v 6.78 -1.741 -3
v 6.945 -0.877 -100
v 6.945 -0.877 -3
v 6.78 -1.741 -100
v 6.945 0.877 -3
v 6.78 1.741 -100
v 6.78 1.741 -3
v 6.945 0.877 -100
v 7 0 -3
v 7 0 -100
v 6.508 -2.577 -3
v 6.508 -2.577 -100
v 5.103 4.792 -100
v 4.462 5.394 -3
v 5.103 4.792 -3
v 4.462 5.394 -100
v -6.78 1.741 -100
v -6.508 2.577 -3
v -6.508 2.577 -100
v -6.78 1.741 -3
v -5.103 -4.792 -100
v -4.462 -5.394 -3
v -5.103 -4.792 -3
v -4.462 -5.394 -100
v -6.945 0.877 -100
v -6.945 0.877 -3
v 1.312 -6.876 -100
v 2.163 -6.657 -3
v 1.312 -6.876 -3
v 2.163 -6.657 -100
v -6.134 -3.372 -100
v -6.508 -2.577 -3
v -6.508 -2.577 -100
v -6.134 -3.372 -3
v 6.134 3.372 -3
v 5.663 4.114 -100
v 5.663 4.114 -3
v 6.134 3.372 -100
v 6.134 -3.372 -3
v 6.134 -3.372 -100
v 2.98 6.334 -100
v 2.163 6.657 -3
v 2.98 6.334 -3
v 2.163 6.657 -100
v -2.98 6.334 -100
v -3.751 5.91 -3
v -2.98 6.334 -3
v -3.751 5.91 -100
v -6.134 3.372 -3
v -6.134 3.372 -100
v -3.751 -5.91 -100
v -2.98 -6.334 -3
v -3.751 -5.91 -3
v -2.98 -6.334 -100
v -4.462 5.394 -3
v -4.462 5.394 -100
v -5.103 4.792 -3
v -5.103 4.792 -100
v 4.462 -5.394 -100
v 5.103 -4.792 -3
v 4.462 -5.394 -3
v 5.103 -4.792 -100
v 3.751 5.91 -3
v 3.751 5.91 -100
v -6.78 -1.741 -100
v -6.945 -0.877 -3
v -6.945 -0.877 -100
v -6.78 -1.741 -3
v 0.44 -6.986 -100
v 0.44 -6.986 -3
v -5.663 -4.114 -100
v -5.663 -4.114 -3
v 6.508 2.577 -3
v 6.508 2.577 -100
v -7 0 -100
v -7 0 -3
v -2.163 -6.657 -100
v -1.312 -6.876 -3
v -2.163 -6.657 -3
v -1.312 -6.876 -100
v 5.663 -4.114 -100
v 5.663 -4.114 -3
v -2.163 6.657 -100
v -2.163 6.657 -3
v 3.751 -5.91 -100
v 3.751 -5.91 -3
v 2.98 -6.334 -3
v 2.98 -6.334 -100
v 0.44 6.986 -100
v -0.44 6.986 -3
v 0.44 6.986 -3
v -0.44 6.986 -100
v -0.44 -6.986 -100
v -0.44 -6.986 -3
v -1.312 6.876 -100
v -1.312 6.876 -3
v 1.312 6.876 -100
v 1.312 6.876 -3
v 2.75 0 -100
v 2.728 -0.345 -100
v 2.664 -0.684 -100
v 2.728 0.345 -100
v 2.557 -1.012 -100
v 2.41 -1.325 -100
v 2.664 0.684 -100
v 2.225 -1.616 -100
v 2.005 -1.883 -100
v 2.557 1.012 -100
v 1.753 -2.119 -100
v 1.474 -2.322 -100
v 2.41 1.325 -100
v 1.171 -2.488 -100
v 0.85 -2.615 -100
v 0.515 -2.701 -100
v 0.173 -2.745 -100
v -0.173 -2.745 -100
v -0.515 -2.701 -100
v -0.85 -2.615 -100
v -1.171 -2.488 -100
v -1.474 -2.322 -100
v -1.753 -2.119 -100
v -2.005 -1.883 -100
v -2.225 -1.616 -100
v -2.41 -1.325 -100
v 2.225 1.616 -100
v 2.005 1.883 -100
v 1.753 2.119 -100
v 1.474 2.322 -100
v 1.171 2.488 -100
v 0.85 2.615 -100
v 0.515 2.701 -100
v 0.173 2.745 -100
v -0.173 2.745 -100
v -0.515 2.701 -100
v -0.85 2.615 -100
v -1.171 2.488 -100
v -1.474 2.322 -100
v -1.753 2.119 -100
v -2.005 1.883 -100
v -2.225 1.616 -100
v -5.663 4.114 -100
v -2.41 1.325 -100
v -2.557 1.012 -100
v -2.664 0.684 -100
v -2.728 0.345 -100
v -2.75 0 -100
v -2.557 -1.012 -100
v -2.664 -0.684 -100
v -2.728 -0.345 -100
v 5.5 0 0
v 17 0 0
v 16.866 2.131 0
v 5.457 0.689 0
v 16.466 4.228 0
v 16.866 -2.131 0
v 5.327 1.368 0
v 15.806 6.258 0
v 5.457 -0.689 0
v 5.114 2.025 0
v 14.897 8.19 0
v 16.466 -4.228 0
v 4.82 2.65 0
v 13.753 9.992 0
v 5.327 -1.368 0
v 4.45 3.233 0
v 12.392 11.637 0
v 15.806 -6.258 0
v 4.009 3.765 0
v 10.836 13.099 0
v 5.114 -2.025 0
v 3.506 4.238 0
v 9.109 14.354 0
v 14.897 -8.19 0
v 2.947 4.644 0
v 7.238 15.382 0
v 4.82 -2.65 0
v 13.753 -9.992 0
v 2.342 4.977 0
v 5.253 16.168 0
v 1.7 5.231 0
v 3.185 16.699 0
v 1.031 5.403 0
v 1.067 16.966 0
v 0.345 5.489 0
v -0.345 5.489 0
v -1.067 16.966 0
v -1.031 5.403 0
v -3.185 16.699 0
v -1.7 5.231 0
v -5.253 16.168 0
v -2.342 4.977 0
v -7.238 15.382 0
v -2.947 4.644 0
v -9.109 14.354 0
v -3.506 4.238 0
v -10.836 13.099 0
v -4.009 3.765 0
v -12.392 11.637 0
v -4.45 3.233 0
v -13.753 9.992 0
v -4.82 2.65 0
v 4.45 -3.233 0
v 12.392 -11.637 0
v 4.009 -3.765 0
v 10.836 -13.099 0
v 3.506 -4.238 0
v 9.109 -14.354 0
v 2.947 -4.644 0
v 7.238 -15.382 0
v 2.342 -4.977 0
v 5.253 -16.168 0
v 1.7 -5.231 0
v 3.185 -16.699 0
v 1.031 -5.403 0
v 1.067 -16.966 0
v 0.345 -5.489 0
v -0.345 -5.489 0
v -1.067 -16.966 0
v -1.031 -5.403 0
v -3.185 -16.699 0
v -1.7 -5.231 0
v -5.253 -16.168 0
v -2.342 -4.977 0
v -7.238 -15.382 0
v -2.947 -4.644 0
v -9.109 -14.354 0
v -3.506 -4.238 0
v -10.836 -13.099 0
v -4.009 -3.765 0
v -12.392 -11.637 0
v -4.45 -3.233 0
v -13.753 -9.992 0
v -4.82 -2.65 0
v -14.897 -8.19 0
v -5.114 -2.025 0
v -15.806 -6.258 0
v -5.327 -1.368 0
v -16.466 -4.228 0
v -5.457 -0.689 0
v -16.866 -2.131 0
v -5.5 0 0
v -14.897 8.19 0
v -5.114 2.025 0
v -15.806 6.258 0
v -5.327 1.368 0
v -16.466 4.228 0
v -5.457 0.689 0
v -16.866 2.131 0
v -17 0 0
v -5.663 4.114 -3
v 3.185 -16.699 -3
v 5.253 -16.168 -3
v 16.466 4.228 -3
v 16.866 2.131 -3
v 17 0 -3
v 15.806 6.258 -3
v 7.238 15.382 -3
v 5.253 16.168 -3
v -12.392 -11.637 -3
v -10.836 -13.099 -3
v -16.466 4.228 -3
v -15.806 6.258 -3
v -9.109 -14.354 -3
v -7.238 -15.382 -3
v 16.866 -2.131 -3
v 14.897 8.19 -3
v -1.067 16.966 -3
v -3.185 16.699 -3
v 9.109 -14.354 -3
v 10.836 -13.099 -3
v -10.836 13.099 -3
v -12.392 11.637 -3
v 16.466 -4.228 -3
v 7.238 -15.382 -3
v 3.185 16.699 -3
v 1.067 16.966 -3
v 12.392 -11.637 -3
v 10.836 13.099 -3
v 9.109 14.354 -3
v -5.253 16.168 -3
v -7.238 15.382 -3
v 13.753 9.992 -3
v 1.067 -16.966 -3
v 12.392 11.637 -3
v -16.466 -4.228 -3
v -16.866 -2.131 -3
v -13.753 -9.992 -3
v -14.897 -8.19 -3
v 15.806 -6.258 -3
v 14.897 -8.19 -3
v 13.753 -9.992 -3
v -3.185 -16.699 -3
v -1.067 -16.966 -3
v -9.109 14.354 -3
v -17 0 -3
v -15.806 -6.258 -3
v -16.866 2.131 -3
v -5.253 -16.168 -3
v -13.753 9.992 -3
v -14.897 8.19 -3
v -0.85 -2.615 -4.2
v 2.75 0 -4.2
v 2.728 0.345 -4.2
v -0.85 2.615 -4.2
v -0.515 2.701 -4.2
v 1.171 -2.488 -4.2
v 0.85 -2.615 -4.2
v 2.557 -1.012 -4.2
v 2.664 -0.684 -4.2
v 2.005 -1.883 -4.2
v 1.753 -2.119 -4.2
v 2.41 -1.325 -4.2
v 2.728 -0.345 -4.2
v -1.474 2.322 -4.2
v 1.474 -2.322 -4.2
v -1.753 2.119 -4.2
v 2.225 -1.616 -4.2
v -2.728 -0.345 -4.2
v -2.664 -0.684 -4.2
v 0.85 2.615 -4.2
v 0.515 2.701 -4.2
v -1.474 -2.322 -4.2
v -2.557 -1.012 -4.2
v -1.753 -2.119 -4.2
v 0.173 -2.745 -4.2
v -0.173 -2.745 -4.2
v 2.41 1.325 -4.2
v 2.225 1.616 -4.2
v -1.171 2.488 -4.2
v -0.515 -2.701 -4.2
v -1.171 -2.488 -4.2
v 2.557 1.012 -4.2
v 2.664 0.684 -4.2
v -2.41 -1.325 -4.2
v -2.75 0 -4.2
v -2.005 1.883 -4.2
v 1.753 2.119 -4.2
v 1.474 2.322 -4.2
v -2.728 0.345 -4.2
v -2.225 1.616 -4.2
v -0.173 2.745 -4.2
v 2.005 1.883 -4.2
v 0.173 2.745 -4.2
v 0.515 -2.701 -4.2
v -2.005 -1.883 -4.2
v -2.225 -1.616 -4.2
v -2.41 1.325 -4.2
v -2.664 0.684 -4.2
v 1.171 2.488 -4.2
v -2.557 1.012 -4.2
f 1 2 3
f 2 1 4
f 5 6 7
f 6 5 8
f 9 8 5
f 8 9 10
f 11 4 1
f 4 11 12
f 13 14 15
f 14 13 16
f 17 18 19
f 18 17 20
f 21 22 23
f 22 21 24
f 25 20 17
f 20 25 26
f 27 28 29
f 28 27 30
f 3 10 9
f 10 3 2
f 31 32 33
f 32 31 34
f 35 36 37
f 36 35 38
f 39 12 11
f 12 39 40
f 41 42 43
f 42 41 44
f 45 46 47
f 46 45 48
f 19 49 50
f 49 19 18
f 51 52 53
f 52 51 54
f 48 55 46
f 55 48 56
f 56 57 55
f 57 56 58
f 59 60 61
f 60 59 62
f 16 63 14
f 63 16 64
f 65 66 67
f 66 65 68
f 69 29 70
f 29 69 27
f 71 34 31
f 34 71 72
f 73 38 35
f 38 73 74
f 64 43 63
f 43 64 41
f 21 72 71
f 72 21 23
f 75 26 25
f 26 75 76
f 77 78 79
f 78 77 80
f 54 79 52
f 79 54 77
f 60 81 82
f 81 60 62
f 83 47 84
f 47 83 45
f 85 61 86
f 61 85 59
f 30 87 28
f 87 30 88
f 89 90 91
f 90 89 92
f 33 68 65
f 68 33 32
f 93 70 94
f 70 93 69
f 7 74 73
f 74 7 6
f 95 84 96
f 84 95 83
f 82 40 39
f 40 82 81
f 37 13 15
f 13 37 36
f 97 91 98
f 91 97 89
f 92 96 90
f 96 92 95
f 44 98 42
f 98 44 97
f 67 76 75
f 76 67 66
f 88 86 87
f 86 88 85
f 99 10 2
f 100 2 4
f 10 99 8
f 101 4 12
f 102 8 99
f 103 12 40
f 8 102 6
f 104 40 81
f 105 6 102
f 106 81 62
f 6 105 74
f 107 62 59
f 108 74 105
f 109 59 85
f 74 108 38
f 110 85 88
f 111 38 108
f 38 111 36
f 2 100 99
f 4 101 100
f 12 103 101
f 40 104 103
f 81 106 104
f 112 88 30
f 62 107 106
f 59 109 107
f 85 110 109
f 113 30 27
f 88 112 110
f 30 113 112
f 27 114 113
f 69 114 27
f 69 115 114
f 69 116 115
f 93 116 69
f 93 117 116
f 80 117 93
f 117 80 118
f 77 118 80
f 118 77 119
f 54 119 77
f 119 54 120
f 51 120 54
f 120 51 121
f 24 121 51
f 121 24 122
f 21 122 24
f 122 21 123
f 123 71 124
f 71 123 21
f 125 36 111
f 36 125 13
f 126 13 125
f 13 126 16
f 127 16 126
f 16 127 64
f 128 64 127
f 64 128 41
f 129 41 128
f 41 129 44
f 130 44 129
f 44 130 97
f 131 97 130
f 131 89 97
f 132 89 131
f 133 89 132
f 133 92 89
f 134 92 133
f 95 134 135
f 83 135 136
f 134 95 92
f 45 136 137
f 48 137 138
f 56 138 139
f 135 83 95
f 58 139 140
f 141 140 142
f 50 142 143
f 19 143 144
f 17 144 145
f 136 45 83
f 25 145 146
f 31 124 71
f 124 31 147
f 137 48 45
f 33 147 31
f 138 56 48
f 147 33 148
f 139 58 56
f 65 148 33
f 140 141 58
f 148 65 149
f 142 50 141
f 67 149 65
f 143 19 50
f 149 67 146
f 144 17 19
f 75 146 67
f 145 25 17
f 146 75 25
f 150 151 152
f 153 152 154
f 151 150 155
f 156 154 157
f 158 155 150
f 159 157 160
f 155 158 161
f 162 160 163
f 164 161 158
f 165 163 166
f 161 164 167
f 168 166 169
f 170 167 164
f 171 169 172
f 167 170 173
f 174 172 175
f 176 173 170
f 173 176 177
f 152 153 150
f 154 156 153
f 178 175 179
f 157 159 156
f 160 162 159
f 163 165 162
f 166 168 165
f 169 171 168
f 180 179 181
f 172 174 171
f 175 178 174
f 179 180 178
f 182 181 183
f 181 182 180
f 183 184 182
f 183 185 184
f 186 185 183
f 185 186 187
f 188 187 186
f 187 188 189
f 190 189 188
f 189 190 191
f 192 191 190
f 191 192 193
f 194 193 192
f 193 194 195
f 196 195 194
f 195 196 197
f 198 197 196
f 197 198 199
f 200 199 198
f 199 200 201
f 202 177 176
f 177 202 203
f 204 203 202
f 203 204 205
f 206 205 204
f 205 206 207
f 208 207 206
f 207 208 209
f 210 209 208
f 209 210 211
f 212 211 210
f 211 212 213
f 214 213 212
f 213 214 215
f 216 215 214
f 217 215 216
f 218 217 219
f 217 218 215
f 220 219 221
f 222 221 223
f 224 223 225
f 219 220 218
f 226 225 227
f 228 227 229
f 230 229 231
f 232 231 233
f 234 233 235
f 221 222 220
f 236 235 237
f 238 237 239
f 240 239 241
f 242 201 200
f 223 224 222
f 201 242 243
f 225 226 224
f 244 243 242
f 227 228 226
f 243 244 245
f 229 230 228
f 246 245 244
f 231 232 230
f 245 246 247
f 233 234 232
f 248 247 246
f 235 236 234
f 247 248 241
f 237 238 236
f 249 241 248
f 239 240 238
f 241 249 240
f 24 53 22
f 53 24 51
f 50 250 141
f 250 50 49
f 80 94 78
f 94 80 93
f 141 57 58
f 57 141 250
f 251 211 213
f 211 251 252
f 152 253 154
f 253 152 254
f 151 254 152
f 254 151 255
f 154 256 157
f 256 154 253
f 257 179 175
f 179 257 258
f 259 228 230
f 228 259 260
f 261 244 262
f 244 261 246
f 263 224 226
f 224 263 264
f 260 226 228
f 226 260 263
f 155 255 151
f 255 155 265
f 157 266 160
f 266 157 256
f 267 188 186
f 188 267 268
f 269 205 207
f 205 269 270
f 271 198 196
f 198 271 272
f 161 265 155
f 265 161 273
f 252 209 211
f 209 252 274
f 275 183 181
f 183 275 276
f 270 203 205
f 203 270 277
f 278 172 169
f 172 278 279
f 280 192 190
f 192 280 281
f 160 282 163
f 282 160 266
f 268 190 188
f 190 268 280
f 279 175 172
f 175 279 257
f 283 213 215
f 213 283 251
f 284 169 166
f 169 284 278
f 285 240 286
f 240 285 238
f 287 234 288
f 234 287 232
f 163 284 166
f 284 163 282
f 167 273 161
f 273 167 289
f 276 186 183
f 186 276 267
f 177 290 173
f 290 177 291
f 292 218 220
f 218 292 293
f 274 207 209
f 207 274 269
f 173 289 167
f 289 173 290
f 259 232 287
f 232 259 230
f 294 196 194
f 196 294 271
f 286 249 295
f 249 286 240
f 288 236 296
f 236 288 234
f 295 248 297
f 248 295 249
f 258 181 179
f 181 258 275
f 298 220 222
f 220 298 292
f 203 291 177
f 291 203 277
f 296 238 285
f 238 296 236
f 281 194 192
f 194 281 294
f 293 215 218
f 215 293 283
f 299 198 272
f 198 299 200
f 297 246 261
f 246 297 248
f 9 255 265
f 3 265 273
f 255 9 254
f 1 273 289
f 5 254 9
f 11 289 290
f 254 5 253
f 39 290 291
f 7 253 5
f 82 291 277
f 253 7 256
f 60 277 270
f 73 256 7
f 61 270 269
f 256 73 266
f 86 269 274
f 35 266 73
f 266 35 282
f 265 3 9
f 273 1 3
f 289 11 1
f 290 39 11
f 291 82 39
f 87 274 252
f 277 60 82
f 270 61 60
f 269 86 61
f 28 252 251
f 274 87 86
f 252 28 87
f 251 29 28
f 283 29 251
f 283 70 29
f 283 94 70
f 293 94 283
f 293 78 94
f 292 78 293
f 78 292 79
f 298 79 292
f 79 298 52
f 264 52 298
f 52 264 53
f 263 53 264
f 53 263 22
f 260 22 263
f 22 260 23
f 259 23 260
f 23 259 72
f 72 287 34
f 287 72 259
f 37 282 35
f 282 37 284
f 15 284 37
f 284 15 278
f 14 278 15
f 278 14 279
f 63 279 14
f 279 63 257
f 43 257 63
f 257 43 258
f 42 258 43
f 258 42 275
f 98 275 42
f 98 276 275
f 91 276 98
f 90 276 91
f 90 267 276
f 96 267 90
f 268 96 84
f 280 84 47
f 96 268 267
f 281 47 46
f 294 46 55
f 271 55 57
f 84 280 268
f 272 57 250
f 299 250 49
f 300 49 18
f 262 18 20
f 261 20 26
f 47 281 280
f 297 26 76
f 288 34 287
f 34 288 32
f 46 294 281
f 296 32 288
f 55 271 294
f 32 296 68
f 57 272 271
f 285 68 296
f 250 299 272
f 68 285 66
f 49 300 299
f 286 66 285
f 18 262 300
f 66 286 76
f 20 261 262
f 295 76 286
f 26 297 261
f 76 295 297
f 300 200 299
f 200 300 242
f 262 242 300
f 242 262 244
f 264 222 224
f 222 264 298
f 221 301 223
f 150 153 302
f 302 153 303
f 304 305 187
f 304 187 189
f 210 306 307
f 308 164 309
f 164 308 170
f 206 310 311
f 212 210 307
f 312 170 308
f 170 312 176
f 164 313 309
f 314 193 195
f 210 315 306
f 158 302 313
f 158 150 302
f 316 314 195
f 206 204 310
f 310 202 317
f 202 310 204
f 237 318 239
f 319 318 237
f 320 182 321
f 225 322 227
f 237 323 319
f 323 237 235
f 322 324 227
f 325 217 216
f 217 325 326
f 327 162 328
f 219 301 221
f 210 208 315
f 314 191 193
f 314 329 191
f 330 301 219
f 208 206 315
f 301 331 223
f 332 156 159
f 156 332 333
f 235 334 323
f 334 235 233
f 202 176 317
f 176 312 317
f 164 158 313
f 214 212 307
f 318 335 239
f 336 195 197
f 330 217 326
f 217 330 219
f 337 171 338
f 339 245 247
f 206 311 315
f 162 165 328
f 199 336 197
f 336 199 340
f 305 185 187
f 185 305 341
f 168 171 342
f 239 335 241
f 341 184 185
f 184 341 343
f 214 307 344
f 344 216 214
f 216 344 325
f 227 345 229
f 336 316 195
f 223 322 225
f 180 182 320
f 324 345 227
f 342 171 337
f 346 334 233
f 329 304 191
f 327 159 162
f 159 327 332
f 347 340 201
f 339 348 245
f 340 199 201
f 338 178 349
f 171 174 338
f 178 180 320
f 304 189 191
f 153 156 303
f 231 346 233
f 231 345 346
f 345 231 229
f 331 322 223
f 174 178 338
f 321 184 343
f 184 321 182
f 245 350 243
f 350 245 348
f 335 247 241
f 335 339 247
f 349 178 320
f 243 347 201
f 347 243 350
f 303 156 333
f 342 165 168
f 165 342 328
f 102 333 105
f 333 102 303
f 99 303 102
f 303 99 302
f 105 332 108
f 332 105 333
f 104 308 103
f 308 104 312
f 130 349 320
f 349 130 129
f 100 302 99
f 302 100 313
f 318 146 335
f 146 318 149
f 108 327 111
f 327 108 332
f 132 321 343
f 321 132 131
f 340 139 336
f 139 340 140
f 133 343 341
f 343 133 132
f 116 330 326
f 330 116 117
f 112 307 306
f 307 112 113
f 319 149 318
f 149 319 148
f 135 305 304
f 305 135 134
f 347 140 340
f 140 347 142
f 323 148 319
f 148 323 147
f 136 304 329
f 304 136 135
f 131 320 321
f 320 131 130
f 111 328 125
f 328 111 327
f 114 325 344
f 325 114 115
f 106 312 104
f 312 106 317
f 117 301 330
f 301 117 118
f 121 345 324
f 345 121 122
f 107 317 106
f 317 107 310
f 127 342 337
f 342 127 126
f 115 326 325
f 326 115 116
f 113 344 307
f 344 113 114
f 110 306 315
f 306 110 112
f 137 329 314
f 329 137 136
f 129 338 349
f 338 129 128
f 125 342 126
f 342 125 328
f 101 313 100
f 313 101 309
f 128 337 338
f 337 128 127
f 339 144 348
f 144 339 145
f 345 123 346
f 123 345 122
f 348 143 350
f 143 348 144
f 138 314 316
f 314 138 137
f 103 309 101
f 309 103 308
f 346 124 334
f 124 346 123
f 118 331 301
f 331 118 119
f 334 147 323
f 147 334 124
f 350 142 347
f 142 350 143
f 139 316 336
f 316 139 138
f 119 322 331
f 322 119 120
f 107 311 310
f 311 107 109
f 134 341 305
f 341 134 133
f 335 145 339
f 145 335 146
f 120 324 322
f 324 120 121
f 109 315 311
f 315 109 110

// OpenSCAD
$fn = 50;


difference() {
	union() {
		translate(v = [0, 0, -100.0000000000]) {
			cylinder(h = 100, r = 7.0000000000);
		}
		translate(v = [0, 0, -3.0000000000]) {
			cylinder(h = 3, r = 17.0000000000);
		}
	}
	union() {
		translate(v = [0, 0, 0]) {
			rotate(a = [0, 0, 0]) {
				difference() {
					union() {
						#translate(v = [0, 0, -100.0000000000]) {
							cylinder(h = 100, r = 2.2500000000);
						}
						#translate(v = [0, 0, -4.2000000000]) {
							cylinder(h = 4.2000000000, r = 7.0000000000, r1 = 2.7500000000, r2 = 5.5000000000);
						}
						#translate(v = [0, 0, -100.0000000000]) {
							cylinder(h = 100, r = 2.7500000000);
						}
						#translate(v = [0, 0, -100.0000000000]) {
							cylinder(h = 100, r = 2.2500000000);
						}
					}
					union();
				}
			}
		}
	}
}
